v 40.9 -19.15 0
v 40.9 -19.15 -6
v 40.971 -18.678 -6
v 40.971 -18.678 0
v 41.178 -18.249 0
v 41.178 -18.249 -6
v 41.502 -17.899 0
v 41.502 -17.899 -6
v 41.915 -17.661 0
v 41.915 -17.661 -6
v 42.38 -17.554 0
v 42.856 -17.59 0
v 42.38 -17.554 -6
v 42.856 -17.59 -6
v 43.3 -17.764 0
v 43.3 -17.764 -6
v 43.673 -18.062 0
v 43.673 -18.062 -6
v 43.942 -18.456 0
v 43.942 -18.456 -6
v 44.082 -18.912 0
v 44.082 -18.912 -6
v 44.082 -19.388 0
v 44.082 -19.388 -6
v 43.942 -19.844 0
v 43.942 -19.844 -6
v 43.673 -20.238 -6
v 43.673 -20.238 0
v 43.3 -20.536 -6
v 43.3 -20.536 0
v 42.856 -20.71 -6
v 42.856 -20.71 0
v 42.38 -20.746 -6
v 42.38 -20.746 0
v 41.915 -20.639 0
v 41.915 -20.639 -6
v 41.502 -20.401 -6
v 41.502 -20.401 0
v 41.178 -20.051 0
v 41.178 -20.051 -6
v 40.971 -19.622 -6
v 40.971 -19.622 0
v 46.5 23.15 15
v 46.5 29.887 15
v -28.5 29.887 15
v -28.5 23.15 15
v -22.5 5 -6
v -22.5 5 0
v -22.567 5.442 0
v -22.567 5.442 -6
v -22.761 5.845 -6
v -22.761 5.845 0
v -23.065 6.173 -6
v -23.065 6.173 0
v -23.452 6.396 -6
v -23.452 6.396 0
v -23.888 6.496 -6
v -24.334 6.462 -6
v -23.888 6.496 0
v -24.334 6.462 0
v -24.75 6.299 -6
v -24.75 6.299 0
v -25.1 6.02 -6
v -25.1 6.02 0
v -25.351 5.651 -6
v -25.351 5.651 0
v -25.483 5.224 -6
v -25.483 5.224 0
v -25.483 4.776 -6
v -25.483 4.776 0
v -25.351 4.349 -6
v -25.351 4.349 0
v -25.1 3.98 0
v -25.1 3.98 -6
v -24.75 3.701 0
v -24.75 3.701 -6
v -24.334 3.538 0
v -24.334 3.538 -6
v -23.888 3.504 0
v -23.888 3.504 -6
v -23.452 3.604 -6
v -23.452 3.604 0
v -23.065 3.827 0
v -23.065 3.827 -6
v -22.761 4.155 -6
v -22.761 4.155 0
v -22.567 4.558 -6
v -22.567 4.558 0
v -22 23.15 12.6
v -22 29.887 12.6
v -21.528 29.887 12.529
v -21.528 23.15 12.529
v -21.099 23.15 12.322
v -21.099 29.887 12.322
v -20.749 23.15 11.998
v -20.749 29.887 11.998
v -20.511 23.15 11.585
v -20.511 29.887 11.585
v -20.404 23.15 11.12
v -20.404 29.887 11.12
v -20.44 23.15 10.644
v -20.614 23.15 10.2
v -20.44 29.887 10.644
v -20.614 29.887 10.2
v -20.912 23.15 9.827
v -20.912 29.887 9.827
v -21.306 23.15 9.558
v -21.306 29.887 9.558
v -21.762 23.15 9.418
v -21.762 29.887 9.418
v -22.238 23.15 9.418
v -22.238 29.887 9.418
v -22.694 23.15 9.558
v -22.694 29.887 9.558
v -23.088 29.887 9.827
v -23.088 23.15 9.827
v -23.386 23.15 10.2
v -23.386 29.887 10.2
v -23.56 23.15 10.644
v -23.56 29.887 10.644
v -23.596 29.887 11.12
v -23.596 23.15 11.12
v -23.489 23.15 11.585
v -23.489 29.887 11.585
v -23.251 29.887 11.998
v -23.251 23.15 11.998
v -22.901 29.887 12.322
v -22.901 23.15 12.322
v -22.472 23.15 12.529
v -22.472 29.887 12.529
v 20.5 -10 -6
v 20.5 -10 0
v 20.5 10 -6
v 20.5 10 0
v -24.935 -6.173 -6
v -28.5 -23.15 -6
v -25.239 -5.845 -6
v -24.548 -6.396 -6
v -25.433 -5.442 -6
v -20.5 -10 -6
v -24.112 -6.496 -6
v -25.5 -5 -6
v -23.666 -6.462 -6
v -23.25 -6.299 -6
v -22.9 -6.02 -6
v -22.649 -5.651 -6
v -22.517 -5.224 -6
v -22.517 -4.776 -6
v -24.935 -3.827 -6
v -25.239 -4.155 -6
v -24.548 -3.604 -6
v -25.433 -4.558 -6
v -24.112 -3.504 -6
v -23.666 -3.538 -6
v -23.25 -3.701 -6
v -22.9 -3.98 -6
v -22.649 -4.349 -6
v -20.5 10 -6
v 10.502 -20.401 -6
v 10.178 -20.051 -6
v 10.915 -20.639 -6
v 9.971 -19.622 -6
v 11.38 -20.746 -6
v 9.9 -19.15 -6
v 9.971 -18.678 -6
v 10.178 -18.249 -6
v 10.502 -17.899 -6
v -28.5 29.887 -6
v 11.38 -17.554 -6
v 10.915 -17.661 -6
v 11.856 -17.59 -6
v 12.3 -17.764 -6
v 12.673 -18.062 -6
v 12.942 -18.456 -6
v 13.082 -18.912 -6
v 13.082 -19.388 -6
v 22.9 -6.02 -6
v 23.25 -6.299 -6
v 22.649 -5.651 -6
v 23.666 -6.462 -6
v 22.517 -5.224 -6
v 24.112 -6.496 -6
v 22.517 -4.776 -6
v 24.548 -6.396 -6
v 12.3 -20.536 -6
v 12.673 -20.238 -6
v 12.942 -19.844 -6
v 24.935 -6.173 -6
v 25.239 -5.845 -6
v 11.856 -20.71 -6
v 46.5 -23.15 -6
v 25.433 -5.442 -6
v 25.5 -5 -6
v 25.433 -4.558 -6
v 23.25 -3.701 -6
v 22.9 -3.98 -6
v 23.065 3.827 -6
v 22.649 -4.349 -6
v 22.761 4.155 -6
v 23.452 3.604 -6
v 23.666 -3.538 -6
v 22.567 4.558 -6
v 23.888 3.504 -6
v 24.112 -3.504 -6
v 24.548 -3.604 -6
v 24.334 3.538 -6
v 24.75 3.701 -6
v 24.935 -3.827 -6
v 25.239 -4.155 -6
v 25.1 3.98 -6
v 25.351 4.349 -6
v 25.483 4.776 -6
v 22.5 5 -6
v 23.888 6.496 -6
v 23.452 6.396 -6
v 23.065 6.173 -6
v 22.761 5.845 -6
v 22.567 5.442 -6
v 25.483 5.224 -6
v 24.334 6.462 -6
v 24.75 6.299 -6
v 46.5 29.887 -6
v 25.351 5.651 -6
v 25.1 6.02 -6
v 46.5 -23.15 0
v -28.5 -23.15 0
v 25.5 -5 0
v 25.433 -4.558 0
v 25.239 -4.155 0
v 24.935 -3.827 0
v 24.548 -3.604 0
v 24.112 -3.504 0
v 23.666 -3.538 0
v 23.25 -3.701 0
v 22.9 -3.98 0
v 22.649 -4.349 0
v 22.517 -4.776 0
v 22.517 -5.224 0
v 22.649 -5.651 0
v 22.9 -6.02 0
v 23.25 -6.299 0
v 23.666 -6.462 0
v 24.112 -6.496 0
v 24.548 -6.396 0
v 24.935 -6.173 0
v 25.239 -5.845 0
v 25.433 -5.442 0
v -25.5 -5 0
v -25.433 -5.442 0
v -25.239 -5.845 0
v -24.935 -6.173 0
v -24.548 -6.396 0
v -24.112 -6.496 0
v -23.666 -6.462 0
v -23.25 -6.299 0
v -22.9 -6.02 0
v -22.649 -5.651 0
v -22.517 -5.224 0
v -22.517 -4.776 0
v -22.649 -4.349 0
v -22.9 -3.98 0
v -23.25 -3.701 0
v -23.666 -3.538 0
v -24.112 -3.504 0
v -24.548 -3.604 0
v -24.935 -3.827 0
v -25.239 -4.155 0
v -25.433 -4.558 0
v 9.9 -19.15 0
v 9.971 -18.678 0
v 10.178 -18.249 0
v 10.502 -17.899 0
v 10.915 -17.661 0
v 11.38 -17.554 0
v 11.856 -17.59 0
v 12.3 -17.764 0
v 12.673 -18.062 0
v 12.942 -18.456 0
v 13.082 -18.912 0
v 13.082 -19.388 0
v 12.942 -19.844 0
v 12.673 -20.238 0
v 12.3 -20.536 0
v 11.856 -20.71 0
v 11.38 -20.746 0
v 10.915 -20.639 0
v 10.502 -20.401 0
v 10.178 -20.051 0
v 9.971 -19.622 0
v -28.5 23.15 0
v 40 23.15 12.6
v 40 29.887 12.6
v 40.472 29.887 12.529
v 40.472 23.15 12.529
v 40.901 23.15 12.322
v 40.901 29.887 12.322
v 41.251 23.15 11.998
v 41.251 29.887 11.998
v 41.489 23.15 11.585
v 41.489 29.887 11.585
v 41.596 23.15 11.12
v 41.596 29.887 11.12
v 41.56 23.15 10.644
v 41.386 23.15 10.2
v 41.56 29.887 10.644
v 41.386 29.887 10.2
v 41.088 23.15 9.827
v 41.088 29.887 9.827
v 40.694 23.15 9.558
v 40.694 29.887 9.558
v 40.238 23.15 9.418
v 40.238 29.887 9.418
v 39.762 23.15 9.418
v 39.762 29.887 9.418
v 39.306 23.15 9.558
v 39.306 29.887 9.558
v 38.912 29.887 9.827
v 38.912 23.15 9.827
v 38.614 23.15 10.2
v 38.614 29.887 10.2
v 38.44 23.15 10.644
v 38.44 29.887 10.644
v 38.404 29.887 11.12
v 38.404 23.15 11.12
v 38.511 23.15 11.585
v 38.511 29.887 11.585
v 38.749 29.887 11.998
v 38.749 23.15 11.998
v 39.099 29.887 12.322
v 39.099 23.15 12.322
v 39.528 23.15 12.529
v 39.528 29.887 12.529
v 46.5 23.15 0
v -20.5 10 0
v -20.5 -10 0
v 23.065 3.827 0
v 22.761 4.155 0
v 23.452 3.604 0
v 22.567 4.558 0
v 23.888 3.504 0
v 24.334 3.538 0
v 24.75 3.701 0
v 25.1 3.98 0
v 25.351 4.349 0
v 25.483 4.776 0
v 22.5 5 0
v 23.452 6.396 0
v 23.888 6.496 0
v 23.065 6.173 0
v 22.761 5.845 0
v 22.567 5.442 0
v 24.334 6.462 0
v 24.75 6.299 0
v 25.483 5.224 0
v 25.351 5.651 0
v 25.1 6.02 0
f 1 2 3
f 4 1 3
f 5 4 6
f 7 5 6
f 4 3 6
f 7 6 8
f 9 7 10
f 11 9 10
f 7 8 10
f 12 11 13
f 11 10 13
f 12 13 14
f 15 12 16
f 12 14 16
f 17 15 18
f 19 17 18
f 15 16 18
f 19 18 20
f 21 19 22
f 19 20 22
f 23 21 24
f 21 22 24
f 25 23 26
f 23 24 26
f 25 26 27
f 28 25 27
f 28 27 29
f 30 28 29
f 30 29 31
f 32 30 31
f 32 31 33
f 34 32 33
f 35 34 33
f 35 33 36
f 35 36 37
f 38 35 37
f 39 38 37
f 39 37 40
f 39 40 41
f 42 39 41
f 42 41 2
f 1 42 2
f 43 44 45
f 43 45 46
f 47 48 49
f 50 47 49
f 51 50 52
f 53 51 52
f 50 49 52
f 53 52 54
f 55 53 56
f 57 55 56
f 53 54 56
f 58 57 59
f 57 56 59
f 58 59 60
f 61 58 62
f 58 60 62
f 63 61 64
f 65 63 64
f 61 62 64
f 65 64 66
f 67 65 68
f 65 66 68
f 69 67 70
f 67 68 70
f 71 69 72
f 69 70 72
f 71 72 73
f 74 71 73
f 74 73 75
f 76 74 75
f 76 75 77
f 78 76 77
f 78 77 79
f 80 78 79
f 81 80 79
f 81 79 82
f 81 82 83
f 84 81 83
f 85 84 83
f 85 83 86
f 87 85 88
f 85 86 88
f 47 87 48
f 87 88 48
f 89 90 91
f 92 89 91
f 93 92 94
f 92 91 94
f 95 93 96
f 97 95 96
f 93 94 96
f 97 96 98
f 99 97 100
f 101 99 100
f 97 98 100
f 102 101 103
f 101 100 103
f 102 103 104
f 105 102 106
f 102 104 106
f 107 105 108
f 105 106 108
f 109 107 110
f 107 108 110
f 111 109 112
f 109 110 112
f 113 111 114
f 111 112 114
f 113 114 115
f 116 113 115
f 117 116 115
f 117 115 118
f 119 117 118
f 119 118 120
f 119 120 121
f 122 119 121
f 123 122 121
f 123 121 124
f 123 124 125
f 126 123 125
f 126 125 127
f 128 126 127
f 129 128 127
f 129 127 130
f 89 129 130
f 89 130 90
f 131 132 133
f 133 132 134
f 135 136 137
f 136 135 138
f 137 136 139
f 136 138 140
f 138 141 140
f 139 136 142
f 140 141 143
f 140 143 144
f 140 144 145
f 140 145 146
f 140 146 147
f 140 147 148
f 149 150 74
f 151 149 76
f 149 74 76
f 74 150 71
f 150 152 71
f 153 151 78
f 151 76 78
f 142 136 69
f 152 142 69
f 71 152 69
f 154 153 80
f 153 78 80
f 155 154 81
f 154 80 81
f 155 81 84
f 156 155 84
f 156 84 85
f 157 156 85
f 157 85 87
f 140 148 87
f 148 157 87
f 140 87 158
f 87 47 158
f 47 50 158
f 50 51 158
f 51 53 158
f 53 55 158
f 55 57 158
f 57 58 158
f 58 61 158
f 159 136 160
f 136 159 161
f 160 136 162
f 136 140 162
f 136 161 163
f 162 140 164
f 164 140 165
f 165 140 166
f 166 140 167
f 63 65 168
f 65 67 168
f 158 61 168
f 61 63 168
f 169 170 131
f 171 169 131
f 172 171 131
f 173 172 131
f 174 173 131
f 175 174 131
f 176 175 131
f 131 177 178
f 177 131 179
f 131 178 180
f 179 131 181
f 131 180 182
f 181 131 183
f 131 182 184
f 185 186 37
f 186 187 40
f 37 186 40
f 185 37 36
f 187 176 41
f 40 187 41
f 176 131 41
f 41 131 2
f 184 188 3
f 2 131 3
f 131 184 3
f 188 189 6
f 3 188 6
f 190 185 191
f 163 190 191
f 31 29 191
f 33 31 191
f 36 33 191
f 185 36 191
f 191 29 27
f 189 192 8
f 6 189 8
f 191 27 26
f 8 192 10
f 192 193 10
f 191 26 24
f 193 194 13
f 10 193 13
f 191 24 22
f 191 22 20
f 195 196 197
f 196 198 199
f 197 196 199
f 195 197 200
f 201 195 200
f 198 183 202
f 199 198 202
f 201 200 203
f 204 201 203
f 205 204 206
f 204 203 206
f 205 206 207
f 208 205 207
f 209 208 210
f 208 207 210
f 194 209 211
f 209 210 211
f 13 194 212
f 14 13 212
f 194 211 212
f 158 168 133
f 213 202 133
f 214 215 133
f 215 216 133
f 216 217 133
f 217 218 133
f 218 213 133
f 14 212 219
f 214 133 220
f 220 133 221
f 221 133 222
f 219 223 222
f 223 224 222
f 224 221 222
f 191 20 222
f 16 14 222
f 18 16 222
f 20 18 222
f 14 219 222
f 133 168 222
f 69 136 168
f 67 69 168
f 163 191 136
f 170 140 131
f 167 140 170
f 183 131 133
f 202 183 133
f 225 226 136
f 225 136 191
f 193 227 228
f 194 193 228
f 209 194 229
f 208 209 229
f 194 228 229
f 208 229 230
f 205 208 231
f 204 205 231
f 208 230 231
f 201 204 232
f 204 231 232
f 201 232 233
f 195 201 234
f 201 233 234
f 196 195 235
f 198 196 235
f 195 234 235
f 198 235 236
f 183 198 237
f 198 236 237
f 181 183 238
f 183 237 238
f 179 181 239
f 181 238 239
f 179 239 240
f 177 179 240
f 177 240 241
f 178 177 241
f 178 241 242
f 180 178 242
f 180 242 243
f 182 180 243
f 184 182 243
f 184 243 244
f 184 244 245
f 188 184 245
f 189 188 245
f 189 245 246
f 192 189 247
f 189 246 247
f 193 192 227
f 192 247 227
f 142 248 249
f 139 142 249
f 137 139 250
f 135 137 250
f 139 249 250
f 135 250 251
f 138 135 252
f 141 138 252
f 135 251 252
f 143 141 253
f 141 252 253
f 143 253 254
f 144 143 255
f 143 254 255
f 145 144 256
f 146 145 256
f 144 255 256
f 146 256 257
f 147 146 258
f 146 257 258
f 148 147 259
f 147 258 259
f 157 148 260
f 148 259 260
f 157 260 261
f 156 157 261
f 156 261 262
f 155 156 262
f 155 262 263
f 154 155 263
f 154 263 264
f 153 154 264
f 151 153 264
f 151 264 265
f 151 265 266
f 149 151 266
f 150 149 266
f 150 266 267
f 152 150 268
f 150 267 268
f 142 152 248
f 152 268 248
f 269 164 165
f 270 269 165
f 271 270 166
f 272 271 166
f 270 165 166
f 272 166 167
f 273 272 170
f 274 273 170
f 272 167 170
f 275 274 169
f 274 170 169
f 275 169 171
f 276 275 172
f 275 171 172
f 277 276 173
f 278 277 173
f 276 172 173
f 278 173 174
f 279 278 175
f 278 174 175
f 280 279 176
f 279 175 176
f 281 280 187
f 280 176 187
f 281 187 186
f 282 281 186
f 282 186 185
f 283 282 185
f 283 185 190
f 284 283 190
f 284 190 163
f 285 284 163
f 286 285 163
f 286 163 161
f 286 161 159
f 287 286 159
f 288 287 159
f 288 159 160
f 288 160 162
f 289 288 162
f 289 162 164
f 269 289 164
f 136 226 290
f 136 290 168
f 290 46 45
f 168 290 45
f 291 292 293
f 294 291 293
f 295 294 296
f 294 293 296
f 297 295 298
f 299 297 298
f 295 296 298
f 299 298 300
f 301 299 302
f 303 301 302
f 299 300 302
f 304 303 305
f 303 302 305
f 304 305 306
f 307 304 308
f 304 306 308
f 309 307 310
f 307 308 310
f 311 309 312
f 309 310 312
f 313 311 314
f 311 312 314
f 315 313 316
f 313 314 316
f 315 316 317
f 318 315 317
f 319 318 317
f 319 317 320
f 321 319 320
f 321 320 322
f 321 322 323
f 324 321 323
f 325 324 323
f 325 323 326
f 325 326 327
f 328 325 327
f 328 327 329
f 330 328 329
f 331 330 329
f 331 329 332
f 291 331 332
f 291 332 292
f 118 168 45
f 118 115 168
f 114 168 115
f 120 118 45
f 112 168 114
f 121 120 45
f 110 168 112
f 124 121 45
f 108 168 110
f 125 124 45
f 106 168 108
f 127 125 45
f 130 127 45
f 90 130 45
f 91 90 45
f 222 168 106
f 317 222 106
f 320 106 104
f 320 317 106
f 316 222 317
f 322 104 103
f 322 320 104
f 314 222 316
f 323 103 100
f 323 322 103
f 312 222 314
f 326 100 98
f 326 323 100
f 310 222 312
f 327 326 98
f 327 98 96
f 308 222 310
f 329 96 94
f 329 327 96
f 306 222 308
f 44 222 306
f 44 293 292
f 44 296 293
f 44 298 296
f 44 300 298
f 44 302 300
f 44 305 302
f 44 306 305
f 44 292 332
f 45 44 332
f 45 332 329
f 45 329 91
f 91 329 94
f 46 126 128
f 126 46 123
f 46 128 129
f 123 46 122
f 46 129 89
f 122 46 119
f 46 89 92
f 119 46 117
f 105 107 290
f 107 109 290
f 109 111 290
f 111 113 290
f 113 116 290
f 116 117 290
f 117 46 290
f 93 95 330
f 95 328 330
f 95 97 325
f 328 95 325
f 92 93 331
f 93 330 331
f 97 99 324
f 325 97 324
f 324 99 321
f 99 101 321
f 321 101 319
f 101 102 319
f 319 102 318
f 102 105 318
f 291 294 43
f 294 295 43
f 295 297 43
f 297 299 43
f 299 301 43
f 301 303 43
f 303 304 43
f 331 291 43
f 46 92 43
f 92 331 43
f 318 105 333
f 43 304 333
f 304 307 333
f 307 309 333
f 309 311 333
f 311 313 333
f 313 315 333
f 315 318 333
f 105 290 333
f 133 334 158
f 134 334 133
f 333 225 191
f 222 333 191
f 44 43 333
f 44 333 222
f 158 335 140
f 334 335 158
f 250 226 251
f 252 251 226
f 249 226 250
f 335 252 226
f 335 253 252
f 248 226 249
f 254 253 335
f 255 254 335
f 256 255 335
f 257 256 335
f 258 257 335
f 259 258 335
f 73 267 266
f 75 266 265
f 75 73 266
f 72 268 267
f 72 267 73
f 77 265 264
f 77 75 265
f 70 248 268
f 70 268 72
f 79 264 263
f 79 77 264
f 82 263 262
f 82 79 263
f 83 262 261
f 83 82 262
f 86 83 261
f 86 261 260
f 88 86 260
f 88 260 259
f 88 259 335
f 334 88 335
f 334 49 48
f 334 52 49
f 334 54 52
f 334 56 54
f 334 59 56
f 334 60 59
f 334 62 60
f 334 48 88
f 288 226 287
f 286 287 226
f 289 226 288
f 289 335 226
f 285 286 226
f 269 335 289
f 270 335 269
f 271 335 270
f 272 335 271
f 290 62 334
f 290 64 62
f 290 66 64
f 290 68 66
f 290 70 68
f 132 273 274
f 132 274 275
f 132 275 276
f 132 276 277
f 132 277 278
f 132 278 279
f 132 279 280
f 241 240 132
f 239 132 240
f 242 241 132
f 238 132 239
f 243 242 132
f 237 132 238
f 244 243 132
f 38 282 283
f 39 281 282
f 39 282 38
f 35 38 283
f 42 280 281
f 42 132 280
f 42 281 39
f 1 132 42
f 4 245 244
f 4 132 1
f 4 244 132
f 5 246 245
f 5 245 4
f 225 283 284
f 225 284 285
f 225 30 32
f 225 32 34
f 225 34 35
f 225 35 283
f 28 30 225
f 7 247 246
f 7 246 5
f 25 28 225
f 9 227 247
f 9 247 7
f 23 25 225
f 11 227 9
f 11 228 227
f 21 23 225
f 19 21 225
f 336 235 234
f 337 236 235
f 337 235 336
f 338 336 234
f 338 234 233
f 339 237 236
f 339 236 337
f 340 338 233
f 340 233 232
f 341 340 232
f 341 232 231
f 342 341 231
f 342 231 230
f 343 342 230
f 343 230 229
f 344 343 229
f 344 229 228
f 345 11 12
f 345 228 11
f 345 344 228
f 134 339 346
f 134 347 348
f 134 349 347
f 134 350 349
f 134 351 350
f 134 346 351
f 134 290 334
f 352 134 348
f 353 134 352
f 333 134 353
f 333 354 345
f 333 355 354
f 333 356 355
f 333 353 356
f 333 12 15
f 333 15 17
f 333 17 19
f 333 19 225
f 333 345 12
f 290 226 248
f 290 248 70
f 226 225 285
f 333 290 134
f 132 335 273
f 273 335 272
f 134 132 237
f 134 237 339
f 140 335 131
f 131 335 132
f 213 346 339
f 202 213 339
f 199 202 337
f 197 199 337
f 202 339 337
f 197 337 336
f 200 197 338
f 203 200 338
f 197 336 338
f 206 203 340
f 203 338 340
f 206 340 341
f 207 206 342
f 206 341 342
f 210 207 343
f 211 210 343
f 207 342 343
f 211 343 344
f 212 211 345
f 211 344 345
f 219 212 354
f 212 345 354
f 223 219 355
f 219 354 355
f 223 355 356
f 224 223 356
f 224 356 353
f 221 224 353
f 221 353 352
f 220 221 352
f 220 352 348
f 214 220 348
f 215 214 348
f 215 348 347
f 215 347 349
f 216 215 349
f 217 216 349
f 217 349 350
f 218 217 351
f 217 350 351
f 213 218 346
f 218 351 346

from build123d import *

# Parameters (mm, degrees)
SKETCH1_W           = 75
SKETCH1_H           = 46.3
SKETCH1_R           = 1.5
SKETCH1_W_2         = 41
SKETCH1_H_2         = 20
BASE_FLANGE2_DEPTH  = 6
EDGE_FLANGE1_DEPTH  = 75
CUT_EXTRUDE1_REACH  = 74.112
SKETCH15_R          = 1.6
CUT_EXTRUDE2_REACH  = 61.131
SKETCH16_R          = 1.6
SKETCH17_W          = 75
SKETCH17_H          = 21
BOSS_EXTRUDE1_DEPTH = 6.7366
CUT_EXTRUDE3_REACH  = 74.112
SKETCH18_R          = 1.6


# Sheet-metal steps are written as plain solids
with BuildPart() as part:
    # Sketch1 → Base-Flange2 (new body)
    with BuildSketch(Plane.XY):
        with Locations((9, 0)):
            Rectangle(SKETCH1_W, SKETCH1_H)
        with Locations((-24, 5)):
            Circle(SKETCH1_R, mode=Mode.SUBTRACT)
        with Locations(Location((24, 5, 0), (0, 0, 180))):
            Circle(SKETCH1_R, mode=Mode.SUBTRACT)
        with Locations((24, -5)):
            Circle(SKETCH1_R, mode=Mode.SUBTRACT)
        with Locations(Location((-24, -5, 0), (0, 0, 180))):
            Circle(SKETCH1_R, mode=Mode.SUBTRACT)
        Rectangle(SKETCH1_W_2, SKETCH1_H_2, mode=Mode.SUBTRACT)
    extrude(amount=-BASE_FLANGE2_DEPTH)

    # Edge-Flange1 section (across the edge) → Edge-Flange1 (add)
    with BuildSketch(Plane(origin=(46.5, 23.8866, 0), x_dir=(0, -1, 0), z_dir=(-1, 0, 0))):
        with BuildLine():
            Line((-6, 0.7366), (-6, 15))
            Line((-6, 15), (0, 15))
            Line((0, 15), (0, 0.7366))
            ThreePointArc((0, 0.7366), (0.215745145, 0.215745145), (0.7366, 0))
            Line((0.7366, 0), (0.7366, -6))
            ThreePointArc((0.7366, -6), (-4.026895542, -4.026895542), (-6, 0.7366))
        make_face()
    extrude(amount=EDGE_FLANGE1_DEPTH)

    # Sketch15 → Cut-Extrude1 (cut, up to next)
    with BuildSketch(Plane(origin=(0, 29.8866, 0), x_dir=(1, 0, 0), z_dir=(0, 1, 0)), mode=Mode.PRIVATE) as cut_extrude1_sk1:
        with Locations(Location((-22, -11, 0), (0, 0, 270))):
            Circle(SKETCH15_R)
    cut_extrude1_tool1 = extrude(cut_extrude1_sk1.sketch, amount=-CUT_EXTRUDE1_REACH, mode=Mode.PRIVATE) & part.part
    # Sketch15 → Cut-Extrude1 (cut, up to next)
    with BuildSketch(Plane(origin=(0, 29.8866, 0), x_dir=(1, 0, 0), z_dir=(0, 1, 0)), mode=Mode.PRIVATE) as cut_extrude1_sk2:
        with Locations(Location((40, -11, 0), (0, 0, 90))):
            Circle(SKETCH15_R)
    cut_extrude1_tool2 = extrude(cut_extrude1_sk2.sketch, amount=-CUT_EXTRUDE1_REACH, mode=Mode.PRIVATE) & part.part
    add(cut_extrude1_tool1.solids().sort_by_distance((-22, 29.8866, 11))[0], mode=Mode.SUBTRACT)
    add(cut_extrude1_tool2.solids().sort_by_distance((40, 29.8866, 11))[0], mode=Mode.SUBTRACT)

    # Sketch16 → Cut-Extrude2 (cut, up to next)
    with BuildSketch(Plane(origin=(0, 0, -6), x_dir=(-1, 0, 0), z_dir=(0, 0, -1)), mode=Mode.PRIVATE) as cut_extrude2_sk1:
        with Locations((-42.5, -19.15)):
            Circle(SKETCH16_R)
    cut_extrude2_tool1 = extrude(cut_extrude2_sk1.sketch, amount=-CUT_EXTRUDE2_REACH, mode=Mode.PRIVATE) & part.part
    # Sketch16 → Cut-Extrude2 (cut, up to next)
    with BuildSketch(Plane(origin=(0, 0, -6), x_dir=(-1, 0, 0), z_dir=(0, 0, -1)), mode=Mode.PRIVATE) as cut_extrude2_sk2:
        with Locations((-11.5, -19.15)):
            Circle(SKETCH16_R)
    cut_extrude2_tool2 = extrude(cut_extrude2_sk2.sketch, amount=-CUT_EXTRUDE2_REACH, mode=Mode.PRIVATE) & part.part
    add(cut_extrude2_tool1.solids().sort_by_distance((42.5, -19.15, -6))[0], mode=Mode.SUBTRACT)
    add(cut_extrude2_tool2.solids().sort_by_distance((11.5, -19.15, -6))[0], mode=Mode.SUBTRACT)

    # Sketch17 → Boss-Extrude1 (add)
    with BuildSketch(Plane(origin=(0, 29.8866, 0), x_dir=(1, 0, 0), z_dir=(0, 1, 0))):
        with Locations((9, -4.5)):
            Rectangle(SKETCH17_W, SKETCH17_H)
    extrude(amount=-BOSS_EXTRUDE1_DEPTH)

    # Sketch18 → Cut-Extrude3 (cut, up to next)
    with BuildSketch(Plane(origin=(0, 29.8866, 0), x_dir=(1, 0, 0), z_dir=(0, 1, 0)), mode=Mode.PRIVATE) as cut_extrude3_sk1:
        with Locations(Location((-22, -11, 0), (0, 0, 270))):
            Circle(SKETCH18_R)
    cut_extrude3_tool1 = extrude(cut_extrude3_sk1.sketch, amount=-CUT_EXTRUDE3_REACH, mode=Mode.PRIVATE) & part.part
    # Sketch18 → Cut-Extrude3 (cut, up to next)
    with BuildSketch(Plane(origin=(0, 29.8866, 0), x_dir=(1, 0, 0), z_dir=(0, 1, 0)), mode=Mode.PRIVATE) as cut_extrude3_sk2:
        with Locations(Location((40, -11, 0), (0, 0, 270))):
            Circle(SKETCH18_R)
    cut_extrude3_tool2 = extrude(cut_extrude3_sk2.sketch, amount=-CUT_EXTRUDE3_REACH, mode=Mode.PRIVATE) & part.part
    add(cut_extrude3_tool1.solids().sort_by_distance((-22, 29.8866, 11))[0], mode=Mode.SUBTRACT)
    add(cut_extrude3_tool2.solids().sort_by_distance((40, 29.8866, 11))[0], mode=Mode.SUBTRACT)


solid = part.part
